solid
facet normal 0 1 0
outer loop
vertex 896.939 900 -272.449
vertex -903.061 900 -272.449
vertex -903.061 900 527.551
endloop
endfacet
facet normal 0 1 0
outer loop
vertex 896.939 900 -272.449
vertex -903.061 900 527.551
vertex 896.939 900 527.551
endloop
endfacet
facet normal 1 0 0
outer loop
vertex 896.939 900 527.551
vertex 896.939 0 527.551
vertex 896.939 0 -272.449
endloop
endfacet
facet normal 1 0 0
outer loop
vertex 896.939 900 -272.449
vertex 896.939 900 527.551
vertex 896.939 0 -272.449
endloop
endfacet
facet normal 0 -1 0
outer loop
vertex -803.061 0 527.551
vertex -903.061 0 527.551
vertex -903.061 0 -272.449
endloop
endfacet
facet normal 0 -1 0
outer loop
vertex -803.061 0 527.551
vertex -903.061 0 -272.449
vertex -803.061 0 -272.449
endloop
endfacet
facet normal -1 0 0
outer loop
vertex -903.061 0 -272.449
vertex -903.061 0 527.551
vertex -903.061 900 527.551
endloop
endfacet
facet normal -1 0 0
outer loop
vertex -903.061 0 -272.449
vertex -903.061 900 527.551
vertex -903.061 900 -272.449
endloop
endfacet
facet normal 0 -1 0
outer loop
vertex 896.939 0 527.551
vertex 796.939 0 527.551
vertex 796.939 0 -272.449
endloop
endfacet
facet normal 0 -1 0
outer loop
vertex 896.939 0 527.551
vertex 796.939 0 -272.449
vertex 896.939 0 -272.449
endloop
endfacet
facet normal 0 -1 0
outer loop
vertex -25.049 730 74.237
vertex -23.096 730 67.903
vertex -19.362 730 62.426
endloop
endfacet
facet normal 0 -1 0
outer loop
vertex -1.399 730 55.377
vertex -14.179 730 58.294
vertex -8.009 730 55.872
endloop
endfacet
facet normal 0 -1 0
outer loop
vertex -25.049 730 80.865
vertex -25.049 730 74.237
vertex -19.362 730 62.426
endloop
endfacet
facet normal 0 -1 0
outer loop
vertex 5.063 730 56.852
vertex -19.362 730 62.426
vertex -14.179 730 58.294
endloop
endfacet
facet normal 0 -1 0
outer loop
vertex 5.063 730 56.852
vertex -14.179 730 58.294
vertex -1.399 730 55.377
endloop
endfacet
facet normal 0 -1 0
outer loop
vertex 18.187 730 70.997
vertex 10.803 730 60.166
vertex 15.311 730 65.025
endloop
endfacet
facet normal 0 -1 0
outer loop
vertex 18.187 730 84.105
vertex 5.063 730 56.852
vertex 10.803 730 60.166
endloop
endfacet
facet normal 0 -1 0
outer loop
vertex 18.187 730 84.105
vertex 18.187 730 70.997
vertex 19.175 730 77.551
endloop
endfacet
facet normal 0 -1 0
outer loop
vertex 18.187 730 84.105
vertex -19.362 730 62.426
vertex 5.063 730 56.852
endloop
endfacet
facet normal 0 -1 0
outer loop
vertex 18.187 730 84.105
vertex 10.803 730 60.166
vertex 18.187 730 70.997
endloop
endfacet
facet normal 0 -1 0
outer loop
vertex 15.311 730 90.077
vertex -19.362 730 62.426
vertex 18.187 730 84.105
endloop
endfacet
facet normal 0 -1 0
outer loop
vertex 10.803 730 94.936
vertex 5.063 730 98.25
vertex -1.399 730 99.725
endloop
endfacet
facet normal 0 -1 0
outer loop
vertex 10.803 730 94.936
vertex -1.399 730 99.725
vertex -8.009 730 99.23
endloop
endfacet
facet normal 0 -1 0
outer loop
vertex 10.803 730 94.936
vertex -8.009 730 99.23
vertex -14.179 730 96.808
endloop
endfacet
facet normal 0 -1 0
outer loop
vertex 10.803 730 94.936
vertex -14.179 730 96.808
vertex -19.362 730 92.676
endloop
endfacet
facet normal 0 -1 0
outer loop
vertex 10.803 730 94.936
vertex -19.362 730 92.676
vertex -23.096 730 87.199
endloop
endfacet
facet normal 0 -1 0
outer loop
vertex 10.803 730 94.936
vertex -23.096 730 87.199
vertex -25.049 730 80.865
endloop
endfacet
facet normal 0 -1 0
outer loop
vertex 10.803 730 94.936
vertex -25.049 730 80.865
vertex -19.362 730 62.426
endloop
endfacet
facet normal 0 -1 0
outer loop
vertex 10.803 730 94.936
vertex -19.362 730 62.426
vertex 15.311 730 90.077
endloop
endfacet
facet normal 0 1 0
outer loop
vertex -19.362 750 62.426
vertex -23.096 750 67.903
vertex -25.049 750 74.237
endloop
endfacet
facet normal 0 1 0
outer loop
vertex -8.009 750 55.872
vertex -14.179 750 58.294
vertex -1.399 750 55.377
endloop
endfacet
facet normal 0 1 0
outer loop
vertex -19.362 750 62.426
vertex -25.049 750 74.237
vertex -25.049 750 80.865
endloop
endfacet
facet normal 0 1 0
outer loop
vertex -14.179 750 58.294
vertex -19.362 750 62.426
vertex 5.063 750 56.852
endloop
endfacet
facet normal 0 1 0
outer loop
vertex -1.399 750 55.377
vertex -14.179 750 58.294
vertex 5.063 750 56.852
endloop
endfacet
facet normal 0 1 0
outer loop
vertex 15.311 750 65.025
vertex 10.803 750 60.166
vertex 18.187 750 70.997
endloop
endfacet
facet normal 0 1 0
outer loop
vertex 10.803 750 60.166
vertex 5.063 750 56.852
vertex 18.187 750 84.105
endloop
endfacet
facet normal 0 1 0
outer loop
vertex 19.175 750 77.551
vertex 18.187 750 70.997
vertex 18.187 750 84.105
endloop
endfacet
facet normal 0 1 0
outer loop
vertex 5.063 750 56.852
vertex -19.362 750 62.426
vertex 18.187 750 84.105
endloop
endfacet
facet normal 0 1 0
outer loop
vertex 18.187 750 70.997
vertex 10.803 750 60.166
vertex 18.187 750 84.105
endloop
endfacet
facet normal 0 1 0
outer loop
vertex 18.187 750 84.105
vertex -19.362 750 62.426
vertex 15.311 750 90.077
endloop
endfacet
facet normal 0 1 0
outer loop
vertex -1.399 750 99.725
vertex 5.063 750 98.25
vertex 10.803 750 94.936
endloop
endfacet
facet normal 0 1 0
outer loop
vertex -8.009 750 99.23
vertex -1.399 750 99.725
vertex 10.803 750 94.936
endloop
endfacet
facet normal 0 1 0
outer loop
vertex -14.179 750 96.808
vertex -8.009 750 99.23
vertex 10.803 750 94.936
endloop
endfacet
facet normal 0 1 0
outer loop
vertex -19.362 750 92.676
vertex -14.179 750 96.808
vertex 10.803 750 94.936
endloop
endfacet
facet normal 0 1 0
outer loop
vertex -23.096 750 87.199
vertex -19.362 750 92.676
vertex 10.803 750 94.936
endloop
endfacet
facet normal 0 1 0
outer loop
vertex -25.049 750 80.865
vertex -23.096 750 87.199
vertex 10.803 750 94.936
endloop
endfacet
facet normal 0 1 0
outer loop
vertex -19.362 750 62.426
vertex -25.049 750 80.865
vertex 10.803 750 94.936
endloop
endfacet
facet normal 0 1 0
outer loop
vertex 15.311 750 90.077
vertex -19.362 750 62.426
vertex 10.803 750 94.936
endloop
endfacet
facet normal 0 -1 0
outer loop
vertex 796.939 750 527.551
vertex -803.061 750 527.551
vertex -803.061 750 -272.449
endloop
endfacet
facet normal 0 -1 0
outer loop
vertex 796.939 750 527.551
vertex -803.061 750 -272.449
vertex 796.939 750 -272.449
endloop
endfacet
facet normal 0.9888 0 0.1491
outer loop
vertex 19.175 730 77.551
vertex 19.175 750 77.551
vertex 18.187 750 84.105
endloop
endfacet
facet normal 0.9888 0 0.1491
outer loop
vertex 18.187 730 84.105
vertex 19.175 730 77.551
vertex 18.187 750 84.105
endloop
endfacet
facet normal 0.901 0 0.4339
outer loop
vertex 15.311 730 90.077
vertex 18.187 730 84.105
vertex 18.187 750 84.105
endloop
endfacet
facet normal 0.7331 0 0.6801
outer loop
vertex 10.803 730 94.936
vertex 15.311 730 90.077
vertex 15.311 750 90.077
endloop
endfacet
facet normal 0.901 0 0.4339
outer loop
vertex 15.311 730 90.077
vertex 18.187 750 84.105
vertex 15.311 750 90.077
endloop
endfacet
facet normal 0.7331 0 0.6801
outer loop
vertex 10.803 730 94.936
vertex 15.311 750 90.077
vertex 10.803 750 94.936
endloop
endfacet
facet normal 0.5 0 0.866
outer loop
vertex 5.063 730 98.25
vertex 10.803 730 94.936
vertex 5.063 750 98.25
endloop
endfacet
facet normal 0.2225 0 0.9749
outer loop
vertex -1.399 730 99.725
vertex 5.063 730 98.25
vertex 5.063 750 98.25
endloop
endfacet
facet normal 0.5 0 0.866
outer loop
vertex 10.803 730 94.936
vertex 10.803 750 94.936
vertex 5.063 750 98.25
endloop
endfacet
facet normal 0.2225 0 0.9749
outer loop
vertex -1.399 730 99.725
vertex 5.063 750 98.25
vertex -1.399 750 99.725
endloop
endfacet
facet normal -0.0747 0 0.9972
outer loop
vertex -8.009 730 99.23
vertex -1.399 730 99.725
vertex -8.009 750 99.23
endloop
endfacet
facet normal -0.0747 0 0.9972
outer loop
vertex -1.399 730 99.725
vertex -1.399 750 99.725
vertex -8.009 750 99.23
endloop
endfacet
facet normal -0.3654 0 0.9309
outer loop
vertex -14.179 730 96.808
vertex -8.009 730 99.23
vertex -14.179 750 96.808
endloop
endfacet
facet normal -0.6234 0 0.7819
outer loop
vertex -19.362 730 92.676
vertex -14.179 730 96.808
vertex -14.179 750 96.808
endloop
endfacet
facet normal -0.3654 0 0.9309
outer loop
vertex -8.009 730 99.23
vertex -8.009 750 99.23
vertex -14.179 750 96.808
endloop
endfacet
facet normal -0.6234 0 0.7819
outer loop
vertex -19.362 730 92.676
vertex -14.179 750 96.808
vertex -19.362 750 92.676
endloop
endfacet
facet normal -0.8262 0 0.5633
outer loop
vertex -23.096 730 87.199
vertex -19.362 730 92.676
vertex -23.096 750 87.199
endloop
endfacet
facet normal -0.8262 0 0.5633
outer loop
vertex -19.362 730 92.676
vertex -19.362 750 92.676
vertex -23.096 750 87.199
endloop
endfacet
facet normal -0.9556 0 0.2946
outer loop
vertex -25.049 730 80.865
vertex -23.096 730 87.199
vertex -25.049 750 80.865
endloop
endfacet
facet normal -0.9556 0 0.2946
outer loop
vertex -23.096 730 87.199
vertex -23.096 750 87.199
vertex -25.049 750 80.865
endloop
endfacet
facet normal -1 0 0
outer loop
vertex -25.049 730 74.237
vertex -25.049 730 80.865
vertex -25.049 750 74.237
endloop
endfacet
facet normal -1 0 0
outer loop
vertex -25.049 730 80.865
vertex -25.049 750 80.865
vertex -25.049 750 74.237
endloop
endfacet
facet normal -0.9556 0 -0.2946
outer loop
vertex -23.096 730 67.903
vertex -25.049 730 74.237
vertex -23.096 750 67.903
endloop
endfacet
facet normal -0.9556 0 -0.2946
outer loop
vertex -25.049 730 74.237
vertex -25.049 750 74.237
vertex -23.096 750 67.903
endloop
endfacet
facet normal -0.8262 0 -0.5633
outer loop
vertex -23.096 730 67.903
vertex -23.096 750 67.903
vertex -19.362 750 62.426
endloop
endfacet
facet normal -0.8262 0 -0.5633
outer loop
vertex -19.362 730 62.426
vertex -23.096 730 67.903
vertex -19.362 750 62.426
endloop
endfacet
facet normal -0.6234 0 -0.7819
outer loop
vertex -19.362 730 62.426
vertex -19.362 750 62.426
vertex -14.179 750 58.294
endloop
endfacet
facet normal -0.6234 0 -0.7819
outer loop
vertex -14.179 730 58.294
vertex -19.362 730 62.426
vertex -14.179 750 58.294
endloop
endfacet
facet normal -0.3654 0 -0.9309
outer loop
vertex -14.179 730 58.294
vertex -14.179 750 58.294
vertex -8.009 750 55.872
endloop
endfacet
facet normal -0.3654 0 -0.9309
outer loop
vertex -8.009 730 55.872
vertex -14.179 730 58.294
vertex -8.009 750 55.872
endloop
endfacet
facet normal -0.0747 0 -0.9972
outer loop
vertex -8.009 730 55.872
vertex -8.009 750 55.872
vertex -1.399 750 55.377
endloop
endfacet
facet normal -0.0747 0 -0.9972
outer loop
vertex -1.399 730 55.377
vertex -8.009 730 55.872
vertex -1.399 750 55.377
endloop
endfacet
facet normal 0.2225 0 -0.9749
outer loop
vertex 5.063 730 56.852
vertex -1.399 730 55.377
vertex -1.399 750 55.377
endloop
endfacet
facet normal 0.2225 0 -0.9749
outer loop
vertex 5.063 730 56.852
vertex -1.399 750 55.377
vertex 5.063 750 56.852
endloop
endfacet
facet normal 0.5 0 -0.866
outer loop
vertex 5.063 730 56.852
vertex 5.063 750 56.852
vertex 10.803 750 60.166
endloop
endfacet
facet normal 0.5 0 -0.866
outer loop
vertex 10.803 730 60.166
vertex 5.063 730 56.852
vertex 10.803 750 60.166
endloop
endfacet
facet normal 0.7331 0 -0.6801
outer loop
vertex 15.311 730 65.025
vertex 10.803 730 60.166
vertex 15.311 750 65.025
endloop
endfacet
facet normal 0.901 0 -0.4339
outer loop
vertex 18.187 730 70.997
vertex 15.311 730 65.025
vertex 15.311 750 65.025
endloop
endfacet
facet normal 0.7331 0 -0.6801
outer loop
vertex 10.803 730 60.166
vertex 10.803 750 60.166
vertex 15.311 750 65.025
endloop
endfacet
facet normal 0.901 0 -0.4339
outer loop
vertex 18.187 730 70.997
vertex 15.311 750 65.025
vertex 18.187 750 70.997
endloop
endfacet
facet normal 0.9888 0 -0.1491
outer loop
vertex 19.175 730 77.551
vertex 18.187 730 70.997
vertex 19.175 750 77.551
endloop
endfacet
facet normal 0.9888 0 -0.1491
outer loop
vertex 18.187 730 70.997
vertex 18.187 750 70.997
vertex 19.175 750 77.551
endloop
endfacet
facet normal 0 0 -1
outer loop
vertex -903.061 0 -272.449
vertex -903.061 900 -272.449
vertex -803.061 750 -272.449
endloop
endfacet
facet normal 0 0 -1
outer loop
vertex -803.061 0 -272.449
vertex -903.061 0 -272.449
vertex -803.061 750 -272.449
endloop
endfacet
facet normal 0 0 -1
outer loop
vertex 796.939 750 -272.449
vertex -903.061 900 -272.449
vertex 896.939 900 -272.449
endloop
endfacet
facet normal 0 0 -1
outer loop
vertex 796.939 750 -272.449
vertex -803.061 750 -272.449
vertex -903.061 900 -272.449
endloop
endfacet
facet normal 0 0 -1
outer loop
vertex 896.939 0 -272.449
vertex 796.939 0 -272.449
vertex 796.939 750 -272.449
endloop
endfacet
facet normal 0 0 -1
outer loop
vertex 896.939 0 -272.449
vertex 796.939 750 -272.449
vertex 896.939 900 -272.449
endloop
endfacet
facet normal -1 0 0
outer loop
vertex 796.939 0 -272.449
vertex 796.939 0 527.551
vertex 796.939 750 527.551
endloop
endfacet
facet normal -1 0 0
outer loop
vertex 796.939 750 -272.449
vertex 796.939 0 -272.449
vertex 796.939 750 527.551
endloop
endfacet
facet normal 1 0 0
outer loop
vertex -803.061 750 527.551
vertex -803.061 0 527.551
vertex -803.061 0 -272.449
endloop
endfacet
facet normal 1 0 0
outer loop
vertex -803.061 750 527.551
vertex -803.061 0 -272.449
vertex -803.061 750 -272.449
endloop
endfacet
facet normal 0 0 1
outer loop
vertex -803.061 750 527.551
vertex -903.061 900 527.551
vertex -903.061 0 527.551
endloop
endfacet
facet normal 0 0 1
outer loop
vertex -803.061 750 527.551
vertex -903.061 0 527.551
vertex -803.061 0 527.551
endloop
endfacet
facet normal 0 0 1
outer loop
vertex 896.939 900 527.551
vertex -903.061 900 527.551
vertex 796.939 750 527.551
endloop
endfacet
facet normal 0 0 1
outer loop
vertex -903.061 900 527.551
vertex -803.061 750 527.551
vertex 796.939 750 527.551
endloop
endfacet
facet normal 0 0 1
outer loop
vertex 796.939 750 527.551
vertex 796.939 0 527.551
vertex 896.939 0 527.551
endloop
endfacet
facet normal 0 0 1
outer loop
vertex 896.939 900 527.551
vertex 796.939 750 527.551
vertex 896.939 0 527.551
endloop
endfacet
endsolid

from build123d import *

# Parameters (mm, degrees)
SKETCH1_W           = 1800
SKETCH1_H           = 800
BOSS_EXTRUDE1_DEPTH = 900
SKETCH2_W           = 1600
SKETCH2_H           = 750
CUT_EXTRUDE1_DEPTH  = 1200
SKETCH3_R           = 22.236476972
BOSS_EXTRUDE2_DEPTH = 20


with BuildPart() as part:
    # Sketch1 → Boss-Extrude1 (new body)
    with BuildSketch(Plane(origin=(0, 0, 0), x_dir=(1, 0, 0), z_dir=(0, 1, 0))):
        with Locations((-3.06122449, -127.551020408)):
            Rectangle(SKETCH1_W, SKETCH1_H)
    extrude(amount=BOSS_EXTRUDE1_DEPTH)

    # Sketch2 → Cut-Extrude1 (cut)
    with BuildSketch(Plane.XY.offset(527.551020408)):
        with Locations((-3.06122449, 375)):
            Rectangle(SKETCH2_W, SKETCH2_H)
    extrude(amount=-CUT_EXTRUDE1_DEPTH, mode=Mode.SUBTRACT)


with BuildPart() as body_2:
    # Sketch3 → Boss-Extrude2 (new body)
    with BuildSketch(Plane.XZ.offset(-750)):
        with Locations((-3.06122449, 77.551020408)):
            Circle(SKETCH3_R)
    extrude(amount=BOSS_EXTRUDE2_DEPTH)


solid = Compound([part.part, body_2.part])
